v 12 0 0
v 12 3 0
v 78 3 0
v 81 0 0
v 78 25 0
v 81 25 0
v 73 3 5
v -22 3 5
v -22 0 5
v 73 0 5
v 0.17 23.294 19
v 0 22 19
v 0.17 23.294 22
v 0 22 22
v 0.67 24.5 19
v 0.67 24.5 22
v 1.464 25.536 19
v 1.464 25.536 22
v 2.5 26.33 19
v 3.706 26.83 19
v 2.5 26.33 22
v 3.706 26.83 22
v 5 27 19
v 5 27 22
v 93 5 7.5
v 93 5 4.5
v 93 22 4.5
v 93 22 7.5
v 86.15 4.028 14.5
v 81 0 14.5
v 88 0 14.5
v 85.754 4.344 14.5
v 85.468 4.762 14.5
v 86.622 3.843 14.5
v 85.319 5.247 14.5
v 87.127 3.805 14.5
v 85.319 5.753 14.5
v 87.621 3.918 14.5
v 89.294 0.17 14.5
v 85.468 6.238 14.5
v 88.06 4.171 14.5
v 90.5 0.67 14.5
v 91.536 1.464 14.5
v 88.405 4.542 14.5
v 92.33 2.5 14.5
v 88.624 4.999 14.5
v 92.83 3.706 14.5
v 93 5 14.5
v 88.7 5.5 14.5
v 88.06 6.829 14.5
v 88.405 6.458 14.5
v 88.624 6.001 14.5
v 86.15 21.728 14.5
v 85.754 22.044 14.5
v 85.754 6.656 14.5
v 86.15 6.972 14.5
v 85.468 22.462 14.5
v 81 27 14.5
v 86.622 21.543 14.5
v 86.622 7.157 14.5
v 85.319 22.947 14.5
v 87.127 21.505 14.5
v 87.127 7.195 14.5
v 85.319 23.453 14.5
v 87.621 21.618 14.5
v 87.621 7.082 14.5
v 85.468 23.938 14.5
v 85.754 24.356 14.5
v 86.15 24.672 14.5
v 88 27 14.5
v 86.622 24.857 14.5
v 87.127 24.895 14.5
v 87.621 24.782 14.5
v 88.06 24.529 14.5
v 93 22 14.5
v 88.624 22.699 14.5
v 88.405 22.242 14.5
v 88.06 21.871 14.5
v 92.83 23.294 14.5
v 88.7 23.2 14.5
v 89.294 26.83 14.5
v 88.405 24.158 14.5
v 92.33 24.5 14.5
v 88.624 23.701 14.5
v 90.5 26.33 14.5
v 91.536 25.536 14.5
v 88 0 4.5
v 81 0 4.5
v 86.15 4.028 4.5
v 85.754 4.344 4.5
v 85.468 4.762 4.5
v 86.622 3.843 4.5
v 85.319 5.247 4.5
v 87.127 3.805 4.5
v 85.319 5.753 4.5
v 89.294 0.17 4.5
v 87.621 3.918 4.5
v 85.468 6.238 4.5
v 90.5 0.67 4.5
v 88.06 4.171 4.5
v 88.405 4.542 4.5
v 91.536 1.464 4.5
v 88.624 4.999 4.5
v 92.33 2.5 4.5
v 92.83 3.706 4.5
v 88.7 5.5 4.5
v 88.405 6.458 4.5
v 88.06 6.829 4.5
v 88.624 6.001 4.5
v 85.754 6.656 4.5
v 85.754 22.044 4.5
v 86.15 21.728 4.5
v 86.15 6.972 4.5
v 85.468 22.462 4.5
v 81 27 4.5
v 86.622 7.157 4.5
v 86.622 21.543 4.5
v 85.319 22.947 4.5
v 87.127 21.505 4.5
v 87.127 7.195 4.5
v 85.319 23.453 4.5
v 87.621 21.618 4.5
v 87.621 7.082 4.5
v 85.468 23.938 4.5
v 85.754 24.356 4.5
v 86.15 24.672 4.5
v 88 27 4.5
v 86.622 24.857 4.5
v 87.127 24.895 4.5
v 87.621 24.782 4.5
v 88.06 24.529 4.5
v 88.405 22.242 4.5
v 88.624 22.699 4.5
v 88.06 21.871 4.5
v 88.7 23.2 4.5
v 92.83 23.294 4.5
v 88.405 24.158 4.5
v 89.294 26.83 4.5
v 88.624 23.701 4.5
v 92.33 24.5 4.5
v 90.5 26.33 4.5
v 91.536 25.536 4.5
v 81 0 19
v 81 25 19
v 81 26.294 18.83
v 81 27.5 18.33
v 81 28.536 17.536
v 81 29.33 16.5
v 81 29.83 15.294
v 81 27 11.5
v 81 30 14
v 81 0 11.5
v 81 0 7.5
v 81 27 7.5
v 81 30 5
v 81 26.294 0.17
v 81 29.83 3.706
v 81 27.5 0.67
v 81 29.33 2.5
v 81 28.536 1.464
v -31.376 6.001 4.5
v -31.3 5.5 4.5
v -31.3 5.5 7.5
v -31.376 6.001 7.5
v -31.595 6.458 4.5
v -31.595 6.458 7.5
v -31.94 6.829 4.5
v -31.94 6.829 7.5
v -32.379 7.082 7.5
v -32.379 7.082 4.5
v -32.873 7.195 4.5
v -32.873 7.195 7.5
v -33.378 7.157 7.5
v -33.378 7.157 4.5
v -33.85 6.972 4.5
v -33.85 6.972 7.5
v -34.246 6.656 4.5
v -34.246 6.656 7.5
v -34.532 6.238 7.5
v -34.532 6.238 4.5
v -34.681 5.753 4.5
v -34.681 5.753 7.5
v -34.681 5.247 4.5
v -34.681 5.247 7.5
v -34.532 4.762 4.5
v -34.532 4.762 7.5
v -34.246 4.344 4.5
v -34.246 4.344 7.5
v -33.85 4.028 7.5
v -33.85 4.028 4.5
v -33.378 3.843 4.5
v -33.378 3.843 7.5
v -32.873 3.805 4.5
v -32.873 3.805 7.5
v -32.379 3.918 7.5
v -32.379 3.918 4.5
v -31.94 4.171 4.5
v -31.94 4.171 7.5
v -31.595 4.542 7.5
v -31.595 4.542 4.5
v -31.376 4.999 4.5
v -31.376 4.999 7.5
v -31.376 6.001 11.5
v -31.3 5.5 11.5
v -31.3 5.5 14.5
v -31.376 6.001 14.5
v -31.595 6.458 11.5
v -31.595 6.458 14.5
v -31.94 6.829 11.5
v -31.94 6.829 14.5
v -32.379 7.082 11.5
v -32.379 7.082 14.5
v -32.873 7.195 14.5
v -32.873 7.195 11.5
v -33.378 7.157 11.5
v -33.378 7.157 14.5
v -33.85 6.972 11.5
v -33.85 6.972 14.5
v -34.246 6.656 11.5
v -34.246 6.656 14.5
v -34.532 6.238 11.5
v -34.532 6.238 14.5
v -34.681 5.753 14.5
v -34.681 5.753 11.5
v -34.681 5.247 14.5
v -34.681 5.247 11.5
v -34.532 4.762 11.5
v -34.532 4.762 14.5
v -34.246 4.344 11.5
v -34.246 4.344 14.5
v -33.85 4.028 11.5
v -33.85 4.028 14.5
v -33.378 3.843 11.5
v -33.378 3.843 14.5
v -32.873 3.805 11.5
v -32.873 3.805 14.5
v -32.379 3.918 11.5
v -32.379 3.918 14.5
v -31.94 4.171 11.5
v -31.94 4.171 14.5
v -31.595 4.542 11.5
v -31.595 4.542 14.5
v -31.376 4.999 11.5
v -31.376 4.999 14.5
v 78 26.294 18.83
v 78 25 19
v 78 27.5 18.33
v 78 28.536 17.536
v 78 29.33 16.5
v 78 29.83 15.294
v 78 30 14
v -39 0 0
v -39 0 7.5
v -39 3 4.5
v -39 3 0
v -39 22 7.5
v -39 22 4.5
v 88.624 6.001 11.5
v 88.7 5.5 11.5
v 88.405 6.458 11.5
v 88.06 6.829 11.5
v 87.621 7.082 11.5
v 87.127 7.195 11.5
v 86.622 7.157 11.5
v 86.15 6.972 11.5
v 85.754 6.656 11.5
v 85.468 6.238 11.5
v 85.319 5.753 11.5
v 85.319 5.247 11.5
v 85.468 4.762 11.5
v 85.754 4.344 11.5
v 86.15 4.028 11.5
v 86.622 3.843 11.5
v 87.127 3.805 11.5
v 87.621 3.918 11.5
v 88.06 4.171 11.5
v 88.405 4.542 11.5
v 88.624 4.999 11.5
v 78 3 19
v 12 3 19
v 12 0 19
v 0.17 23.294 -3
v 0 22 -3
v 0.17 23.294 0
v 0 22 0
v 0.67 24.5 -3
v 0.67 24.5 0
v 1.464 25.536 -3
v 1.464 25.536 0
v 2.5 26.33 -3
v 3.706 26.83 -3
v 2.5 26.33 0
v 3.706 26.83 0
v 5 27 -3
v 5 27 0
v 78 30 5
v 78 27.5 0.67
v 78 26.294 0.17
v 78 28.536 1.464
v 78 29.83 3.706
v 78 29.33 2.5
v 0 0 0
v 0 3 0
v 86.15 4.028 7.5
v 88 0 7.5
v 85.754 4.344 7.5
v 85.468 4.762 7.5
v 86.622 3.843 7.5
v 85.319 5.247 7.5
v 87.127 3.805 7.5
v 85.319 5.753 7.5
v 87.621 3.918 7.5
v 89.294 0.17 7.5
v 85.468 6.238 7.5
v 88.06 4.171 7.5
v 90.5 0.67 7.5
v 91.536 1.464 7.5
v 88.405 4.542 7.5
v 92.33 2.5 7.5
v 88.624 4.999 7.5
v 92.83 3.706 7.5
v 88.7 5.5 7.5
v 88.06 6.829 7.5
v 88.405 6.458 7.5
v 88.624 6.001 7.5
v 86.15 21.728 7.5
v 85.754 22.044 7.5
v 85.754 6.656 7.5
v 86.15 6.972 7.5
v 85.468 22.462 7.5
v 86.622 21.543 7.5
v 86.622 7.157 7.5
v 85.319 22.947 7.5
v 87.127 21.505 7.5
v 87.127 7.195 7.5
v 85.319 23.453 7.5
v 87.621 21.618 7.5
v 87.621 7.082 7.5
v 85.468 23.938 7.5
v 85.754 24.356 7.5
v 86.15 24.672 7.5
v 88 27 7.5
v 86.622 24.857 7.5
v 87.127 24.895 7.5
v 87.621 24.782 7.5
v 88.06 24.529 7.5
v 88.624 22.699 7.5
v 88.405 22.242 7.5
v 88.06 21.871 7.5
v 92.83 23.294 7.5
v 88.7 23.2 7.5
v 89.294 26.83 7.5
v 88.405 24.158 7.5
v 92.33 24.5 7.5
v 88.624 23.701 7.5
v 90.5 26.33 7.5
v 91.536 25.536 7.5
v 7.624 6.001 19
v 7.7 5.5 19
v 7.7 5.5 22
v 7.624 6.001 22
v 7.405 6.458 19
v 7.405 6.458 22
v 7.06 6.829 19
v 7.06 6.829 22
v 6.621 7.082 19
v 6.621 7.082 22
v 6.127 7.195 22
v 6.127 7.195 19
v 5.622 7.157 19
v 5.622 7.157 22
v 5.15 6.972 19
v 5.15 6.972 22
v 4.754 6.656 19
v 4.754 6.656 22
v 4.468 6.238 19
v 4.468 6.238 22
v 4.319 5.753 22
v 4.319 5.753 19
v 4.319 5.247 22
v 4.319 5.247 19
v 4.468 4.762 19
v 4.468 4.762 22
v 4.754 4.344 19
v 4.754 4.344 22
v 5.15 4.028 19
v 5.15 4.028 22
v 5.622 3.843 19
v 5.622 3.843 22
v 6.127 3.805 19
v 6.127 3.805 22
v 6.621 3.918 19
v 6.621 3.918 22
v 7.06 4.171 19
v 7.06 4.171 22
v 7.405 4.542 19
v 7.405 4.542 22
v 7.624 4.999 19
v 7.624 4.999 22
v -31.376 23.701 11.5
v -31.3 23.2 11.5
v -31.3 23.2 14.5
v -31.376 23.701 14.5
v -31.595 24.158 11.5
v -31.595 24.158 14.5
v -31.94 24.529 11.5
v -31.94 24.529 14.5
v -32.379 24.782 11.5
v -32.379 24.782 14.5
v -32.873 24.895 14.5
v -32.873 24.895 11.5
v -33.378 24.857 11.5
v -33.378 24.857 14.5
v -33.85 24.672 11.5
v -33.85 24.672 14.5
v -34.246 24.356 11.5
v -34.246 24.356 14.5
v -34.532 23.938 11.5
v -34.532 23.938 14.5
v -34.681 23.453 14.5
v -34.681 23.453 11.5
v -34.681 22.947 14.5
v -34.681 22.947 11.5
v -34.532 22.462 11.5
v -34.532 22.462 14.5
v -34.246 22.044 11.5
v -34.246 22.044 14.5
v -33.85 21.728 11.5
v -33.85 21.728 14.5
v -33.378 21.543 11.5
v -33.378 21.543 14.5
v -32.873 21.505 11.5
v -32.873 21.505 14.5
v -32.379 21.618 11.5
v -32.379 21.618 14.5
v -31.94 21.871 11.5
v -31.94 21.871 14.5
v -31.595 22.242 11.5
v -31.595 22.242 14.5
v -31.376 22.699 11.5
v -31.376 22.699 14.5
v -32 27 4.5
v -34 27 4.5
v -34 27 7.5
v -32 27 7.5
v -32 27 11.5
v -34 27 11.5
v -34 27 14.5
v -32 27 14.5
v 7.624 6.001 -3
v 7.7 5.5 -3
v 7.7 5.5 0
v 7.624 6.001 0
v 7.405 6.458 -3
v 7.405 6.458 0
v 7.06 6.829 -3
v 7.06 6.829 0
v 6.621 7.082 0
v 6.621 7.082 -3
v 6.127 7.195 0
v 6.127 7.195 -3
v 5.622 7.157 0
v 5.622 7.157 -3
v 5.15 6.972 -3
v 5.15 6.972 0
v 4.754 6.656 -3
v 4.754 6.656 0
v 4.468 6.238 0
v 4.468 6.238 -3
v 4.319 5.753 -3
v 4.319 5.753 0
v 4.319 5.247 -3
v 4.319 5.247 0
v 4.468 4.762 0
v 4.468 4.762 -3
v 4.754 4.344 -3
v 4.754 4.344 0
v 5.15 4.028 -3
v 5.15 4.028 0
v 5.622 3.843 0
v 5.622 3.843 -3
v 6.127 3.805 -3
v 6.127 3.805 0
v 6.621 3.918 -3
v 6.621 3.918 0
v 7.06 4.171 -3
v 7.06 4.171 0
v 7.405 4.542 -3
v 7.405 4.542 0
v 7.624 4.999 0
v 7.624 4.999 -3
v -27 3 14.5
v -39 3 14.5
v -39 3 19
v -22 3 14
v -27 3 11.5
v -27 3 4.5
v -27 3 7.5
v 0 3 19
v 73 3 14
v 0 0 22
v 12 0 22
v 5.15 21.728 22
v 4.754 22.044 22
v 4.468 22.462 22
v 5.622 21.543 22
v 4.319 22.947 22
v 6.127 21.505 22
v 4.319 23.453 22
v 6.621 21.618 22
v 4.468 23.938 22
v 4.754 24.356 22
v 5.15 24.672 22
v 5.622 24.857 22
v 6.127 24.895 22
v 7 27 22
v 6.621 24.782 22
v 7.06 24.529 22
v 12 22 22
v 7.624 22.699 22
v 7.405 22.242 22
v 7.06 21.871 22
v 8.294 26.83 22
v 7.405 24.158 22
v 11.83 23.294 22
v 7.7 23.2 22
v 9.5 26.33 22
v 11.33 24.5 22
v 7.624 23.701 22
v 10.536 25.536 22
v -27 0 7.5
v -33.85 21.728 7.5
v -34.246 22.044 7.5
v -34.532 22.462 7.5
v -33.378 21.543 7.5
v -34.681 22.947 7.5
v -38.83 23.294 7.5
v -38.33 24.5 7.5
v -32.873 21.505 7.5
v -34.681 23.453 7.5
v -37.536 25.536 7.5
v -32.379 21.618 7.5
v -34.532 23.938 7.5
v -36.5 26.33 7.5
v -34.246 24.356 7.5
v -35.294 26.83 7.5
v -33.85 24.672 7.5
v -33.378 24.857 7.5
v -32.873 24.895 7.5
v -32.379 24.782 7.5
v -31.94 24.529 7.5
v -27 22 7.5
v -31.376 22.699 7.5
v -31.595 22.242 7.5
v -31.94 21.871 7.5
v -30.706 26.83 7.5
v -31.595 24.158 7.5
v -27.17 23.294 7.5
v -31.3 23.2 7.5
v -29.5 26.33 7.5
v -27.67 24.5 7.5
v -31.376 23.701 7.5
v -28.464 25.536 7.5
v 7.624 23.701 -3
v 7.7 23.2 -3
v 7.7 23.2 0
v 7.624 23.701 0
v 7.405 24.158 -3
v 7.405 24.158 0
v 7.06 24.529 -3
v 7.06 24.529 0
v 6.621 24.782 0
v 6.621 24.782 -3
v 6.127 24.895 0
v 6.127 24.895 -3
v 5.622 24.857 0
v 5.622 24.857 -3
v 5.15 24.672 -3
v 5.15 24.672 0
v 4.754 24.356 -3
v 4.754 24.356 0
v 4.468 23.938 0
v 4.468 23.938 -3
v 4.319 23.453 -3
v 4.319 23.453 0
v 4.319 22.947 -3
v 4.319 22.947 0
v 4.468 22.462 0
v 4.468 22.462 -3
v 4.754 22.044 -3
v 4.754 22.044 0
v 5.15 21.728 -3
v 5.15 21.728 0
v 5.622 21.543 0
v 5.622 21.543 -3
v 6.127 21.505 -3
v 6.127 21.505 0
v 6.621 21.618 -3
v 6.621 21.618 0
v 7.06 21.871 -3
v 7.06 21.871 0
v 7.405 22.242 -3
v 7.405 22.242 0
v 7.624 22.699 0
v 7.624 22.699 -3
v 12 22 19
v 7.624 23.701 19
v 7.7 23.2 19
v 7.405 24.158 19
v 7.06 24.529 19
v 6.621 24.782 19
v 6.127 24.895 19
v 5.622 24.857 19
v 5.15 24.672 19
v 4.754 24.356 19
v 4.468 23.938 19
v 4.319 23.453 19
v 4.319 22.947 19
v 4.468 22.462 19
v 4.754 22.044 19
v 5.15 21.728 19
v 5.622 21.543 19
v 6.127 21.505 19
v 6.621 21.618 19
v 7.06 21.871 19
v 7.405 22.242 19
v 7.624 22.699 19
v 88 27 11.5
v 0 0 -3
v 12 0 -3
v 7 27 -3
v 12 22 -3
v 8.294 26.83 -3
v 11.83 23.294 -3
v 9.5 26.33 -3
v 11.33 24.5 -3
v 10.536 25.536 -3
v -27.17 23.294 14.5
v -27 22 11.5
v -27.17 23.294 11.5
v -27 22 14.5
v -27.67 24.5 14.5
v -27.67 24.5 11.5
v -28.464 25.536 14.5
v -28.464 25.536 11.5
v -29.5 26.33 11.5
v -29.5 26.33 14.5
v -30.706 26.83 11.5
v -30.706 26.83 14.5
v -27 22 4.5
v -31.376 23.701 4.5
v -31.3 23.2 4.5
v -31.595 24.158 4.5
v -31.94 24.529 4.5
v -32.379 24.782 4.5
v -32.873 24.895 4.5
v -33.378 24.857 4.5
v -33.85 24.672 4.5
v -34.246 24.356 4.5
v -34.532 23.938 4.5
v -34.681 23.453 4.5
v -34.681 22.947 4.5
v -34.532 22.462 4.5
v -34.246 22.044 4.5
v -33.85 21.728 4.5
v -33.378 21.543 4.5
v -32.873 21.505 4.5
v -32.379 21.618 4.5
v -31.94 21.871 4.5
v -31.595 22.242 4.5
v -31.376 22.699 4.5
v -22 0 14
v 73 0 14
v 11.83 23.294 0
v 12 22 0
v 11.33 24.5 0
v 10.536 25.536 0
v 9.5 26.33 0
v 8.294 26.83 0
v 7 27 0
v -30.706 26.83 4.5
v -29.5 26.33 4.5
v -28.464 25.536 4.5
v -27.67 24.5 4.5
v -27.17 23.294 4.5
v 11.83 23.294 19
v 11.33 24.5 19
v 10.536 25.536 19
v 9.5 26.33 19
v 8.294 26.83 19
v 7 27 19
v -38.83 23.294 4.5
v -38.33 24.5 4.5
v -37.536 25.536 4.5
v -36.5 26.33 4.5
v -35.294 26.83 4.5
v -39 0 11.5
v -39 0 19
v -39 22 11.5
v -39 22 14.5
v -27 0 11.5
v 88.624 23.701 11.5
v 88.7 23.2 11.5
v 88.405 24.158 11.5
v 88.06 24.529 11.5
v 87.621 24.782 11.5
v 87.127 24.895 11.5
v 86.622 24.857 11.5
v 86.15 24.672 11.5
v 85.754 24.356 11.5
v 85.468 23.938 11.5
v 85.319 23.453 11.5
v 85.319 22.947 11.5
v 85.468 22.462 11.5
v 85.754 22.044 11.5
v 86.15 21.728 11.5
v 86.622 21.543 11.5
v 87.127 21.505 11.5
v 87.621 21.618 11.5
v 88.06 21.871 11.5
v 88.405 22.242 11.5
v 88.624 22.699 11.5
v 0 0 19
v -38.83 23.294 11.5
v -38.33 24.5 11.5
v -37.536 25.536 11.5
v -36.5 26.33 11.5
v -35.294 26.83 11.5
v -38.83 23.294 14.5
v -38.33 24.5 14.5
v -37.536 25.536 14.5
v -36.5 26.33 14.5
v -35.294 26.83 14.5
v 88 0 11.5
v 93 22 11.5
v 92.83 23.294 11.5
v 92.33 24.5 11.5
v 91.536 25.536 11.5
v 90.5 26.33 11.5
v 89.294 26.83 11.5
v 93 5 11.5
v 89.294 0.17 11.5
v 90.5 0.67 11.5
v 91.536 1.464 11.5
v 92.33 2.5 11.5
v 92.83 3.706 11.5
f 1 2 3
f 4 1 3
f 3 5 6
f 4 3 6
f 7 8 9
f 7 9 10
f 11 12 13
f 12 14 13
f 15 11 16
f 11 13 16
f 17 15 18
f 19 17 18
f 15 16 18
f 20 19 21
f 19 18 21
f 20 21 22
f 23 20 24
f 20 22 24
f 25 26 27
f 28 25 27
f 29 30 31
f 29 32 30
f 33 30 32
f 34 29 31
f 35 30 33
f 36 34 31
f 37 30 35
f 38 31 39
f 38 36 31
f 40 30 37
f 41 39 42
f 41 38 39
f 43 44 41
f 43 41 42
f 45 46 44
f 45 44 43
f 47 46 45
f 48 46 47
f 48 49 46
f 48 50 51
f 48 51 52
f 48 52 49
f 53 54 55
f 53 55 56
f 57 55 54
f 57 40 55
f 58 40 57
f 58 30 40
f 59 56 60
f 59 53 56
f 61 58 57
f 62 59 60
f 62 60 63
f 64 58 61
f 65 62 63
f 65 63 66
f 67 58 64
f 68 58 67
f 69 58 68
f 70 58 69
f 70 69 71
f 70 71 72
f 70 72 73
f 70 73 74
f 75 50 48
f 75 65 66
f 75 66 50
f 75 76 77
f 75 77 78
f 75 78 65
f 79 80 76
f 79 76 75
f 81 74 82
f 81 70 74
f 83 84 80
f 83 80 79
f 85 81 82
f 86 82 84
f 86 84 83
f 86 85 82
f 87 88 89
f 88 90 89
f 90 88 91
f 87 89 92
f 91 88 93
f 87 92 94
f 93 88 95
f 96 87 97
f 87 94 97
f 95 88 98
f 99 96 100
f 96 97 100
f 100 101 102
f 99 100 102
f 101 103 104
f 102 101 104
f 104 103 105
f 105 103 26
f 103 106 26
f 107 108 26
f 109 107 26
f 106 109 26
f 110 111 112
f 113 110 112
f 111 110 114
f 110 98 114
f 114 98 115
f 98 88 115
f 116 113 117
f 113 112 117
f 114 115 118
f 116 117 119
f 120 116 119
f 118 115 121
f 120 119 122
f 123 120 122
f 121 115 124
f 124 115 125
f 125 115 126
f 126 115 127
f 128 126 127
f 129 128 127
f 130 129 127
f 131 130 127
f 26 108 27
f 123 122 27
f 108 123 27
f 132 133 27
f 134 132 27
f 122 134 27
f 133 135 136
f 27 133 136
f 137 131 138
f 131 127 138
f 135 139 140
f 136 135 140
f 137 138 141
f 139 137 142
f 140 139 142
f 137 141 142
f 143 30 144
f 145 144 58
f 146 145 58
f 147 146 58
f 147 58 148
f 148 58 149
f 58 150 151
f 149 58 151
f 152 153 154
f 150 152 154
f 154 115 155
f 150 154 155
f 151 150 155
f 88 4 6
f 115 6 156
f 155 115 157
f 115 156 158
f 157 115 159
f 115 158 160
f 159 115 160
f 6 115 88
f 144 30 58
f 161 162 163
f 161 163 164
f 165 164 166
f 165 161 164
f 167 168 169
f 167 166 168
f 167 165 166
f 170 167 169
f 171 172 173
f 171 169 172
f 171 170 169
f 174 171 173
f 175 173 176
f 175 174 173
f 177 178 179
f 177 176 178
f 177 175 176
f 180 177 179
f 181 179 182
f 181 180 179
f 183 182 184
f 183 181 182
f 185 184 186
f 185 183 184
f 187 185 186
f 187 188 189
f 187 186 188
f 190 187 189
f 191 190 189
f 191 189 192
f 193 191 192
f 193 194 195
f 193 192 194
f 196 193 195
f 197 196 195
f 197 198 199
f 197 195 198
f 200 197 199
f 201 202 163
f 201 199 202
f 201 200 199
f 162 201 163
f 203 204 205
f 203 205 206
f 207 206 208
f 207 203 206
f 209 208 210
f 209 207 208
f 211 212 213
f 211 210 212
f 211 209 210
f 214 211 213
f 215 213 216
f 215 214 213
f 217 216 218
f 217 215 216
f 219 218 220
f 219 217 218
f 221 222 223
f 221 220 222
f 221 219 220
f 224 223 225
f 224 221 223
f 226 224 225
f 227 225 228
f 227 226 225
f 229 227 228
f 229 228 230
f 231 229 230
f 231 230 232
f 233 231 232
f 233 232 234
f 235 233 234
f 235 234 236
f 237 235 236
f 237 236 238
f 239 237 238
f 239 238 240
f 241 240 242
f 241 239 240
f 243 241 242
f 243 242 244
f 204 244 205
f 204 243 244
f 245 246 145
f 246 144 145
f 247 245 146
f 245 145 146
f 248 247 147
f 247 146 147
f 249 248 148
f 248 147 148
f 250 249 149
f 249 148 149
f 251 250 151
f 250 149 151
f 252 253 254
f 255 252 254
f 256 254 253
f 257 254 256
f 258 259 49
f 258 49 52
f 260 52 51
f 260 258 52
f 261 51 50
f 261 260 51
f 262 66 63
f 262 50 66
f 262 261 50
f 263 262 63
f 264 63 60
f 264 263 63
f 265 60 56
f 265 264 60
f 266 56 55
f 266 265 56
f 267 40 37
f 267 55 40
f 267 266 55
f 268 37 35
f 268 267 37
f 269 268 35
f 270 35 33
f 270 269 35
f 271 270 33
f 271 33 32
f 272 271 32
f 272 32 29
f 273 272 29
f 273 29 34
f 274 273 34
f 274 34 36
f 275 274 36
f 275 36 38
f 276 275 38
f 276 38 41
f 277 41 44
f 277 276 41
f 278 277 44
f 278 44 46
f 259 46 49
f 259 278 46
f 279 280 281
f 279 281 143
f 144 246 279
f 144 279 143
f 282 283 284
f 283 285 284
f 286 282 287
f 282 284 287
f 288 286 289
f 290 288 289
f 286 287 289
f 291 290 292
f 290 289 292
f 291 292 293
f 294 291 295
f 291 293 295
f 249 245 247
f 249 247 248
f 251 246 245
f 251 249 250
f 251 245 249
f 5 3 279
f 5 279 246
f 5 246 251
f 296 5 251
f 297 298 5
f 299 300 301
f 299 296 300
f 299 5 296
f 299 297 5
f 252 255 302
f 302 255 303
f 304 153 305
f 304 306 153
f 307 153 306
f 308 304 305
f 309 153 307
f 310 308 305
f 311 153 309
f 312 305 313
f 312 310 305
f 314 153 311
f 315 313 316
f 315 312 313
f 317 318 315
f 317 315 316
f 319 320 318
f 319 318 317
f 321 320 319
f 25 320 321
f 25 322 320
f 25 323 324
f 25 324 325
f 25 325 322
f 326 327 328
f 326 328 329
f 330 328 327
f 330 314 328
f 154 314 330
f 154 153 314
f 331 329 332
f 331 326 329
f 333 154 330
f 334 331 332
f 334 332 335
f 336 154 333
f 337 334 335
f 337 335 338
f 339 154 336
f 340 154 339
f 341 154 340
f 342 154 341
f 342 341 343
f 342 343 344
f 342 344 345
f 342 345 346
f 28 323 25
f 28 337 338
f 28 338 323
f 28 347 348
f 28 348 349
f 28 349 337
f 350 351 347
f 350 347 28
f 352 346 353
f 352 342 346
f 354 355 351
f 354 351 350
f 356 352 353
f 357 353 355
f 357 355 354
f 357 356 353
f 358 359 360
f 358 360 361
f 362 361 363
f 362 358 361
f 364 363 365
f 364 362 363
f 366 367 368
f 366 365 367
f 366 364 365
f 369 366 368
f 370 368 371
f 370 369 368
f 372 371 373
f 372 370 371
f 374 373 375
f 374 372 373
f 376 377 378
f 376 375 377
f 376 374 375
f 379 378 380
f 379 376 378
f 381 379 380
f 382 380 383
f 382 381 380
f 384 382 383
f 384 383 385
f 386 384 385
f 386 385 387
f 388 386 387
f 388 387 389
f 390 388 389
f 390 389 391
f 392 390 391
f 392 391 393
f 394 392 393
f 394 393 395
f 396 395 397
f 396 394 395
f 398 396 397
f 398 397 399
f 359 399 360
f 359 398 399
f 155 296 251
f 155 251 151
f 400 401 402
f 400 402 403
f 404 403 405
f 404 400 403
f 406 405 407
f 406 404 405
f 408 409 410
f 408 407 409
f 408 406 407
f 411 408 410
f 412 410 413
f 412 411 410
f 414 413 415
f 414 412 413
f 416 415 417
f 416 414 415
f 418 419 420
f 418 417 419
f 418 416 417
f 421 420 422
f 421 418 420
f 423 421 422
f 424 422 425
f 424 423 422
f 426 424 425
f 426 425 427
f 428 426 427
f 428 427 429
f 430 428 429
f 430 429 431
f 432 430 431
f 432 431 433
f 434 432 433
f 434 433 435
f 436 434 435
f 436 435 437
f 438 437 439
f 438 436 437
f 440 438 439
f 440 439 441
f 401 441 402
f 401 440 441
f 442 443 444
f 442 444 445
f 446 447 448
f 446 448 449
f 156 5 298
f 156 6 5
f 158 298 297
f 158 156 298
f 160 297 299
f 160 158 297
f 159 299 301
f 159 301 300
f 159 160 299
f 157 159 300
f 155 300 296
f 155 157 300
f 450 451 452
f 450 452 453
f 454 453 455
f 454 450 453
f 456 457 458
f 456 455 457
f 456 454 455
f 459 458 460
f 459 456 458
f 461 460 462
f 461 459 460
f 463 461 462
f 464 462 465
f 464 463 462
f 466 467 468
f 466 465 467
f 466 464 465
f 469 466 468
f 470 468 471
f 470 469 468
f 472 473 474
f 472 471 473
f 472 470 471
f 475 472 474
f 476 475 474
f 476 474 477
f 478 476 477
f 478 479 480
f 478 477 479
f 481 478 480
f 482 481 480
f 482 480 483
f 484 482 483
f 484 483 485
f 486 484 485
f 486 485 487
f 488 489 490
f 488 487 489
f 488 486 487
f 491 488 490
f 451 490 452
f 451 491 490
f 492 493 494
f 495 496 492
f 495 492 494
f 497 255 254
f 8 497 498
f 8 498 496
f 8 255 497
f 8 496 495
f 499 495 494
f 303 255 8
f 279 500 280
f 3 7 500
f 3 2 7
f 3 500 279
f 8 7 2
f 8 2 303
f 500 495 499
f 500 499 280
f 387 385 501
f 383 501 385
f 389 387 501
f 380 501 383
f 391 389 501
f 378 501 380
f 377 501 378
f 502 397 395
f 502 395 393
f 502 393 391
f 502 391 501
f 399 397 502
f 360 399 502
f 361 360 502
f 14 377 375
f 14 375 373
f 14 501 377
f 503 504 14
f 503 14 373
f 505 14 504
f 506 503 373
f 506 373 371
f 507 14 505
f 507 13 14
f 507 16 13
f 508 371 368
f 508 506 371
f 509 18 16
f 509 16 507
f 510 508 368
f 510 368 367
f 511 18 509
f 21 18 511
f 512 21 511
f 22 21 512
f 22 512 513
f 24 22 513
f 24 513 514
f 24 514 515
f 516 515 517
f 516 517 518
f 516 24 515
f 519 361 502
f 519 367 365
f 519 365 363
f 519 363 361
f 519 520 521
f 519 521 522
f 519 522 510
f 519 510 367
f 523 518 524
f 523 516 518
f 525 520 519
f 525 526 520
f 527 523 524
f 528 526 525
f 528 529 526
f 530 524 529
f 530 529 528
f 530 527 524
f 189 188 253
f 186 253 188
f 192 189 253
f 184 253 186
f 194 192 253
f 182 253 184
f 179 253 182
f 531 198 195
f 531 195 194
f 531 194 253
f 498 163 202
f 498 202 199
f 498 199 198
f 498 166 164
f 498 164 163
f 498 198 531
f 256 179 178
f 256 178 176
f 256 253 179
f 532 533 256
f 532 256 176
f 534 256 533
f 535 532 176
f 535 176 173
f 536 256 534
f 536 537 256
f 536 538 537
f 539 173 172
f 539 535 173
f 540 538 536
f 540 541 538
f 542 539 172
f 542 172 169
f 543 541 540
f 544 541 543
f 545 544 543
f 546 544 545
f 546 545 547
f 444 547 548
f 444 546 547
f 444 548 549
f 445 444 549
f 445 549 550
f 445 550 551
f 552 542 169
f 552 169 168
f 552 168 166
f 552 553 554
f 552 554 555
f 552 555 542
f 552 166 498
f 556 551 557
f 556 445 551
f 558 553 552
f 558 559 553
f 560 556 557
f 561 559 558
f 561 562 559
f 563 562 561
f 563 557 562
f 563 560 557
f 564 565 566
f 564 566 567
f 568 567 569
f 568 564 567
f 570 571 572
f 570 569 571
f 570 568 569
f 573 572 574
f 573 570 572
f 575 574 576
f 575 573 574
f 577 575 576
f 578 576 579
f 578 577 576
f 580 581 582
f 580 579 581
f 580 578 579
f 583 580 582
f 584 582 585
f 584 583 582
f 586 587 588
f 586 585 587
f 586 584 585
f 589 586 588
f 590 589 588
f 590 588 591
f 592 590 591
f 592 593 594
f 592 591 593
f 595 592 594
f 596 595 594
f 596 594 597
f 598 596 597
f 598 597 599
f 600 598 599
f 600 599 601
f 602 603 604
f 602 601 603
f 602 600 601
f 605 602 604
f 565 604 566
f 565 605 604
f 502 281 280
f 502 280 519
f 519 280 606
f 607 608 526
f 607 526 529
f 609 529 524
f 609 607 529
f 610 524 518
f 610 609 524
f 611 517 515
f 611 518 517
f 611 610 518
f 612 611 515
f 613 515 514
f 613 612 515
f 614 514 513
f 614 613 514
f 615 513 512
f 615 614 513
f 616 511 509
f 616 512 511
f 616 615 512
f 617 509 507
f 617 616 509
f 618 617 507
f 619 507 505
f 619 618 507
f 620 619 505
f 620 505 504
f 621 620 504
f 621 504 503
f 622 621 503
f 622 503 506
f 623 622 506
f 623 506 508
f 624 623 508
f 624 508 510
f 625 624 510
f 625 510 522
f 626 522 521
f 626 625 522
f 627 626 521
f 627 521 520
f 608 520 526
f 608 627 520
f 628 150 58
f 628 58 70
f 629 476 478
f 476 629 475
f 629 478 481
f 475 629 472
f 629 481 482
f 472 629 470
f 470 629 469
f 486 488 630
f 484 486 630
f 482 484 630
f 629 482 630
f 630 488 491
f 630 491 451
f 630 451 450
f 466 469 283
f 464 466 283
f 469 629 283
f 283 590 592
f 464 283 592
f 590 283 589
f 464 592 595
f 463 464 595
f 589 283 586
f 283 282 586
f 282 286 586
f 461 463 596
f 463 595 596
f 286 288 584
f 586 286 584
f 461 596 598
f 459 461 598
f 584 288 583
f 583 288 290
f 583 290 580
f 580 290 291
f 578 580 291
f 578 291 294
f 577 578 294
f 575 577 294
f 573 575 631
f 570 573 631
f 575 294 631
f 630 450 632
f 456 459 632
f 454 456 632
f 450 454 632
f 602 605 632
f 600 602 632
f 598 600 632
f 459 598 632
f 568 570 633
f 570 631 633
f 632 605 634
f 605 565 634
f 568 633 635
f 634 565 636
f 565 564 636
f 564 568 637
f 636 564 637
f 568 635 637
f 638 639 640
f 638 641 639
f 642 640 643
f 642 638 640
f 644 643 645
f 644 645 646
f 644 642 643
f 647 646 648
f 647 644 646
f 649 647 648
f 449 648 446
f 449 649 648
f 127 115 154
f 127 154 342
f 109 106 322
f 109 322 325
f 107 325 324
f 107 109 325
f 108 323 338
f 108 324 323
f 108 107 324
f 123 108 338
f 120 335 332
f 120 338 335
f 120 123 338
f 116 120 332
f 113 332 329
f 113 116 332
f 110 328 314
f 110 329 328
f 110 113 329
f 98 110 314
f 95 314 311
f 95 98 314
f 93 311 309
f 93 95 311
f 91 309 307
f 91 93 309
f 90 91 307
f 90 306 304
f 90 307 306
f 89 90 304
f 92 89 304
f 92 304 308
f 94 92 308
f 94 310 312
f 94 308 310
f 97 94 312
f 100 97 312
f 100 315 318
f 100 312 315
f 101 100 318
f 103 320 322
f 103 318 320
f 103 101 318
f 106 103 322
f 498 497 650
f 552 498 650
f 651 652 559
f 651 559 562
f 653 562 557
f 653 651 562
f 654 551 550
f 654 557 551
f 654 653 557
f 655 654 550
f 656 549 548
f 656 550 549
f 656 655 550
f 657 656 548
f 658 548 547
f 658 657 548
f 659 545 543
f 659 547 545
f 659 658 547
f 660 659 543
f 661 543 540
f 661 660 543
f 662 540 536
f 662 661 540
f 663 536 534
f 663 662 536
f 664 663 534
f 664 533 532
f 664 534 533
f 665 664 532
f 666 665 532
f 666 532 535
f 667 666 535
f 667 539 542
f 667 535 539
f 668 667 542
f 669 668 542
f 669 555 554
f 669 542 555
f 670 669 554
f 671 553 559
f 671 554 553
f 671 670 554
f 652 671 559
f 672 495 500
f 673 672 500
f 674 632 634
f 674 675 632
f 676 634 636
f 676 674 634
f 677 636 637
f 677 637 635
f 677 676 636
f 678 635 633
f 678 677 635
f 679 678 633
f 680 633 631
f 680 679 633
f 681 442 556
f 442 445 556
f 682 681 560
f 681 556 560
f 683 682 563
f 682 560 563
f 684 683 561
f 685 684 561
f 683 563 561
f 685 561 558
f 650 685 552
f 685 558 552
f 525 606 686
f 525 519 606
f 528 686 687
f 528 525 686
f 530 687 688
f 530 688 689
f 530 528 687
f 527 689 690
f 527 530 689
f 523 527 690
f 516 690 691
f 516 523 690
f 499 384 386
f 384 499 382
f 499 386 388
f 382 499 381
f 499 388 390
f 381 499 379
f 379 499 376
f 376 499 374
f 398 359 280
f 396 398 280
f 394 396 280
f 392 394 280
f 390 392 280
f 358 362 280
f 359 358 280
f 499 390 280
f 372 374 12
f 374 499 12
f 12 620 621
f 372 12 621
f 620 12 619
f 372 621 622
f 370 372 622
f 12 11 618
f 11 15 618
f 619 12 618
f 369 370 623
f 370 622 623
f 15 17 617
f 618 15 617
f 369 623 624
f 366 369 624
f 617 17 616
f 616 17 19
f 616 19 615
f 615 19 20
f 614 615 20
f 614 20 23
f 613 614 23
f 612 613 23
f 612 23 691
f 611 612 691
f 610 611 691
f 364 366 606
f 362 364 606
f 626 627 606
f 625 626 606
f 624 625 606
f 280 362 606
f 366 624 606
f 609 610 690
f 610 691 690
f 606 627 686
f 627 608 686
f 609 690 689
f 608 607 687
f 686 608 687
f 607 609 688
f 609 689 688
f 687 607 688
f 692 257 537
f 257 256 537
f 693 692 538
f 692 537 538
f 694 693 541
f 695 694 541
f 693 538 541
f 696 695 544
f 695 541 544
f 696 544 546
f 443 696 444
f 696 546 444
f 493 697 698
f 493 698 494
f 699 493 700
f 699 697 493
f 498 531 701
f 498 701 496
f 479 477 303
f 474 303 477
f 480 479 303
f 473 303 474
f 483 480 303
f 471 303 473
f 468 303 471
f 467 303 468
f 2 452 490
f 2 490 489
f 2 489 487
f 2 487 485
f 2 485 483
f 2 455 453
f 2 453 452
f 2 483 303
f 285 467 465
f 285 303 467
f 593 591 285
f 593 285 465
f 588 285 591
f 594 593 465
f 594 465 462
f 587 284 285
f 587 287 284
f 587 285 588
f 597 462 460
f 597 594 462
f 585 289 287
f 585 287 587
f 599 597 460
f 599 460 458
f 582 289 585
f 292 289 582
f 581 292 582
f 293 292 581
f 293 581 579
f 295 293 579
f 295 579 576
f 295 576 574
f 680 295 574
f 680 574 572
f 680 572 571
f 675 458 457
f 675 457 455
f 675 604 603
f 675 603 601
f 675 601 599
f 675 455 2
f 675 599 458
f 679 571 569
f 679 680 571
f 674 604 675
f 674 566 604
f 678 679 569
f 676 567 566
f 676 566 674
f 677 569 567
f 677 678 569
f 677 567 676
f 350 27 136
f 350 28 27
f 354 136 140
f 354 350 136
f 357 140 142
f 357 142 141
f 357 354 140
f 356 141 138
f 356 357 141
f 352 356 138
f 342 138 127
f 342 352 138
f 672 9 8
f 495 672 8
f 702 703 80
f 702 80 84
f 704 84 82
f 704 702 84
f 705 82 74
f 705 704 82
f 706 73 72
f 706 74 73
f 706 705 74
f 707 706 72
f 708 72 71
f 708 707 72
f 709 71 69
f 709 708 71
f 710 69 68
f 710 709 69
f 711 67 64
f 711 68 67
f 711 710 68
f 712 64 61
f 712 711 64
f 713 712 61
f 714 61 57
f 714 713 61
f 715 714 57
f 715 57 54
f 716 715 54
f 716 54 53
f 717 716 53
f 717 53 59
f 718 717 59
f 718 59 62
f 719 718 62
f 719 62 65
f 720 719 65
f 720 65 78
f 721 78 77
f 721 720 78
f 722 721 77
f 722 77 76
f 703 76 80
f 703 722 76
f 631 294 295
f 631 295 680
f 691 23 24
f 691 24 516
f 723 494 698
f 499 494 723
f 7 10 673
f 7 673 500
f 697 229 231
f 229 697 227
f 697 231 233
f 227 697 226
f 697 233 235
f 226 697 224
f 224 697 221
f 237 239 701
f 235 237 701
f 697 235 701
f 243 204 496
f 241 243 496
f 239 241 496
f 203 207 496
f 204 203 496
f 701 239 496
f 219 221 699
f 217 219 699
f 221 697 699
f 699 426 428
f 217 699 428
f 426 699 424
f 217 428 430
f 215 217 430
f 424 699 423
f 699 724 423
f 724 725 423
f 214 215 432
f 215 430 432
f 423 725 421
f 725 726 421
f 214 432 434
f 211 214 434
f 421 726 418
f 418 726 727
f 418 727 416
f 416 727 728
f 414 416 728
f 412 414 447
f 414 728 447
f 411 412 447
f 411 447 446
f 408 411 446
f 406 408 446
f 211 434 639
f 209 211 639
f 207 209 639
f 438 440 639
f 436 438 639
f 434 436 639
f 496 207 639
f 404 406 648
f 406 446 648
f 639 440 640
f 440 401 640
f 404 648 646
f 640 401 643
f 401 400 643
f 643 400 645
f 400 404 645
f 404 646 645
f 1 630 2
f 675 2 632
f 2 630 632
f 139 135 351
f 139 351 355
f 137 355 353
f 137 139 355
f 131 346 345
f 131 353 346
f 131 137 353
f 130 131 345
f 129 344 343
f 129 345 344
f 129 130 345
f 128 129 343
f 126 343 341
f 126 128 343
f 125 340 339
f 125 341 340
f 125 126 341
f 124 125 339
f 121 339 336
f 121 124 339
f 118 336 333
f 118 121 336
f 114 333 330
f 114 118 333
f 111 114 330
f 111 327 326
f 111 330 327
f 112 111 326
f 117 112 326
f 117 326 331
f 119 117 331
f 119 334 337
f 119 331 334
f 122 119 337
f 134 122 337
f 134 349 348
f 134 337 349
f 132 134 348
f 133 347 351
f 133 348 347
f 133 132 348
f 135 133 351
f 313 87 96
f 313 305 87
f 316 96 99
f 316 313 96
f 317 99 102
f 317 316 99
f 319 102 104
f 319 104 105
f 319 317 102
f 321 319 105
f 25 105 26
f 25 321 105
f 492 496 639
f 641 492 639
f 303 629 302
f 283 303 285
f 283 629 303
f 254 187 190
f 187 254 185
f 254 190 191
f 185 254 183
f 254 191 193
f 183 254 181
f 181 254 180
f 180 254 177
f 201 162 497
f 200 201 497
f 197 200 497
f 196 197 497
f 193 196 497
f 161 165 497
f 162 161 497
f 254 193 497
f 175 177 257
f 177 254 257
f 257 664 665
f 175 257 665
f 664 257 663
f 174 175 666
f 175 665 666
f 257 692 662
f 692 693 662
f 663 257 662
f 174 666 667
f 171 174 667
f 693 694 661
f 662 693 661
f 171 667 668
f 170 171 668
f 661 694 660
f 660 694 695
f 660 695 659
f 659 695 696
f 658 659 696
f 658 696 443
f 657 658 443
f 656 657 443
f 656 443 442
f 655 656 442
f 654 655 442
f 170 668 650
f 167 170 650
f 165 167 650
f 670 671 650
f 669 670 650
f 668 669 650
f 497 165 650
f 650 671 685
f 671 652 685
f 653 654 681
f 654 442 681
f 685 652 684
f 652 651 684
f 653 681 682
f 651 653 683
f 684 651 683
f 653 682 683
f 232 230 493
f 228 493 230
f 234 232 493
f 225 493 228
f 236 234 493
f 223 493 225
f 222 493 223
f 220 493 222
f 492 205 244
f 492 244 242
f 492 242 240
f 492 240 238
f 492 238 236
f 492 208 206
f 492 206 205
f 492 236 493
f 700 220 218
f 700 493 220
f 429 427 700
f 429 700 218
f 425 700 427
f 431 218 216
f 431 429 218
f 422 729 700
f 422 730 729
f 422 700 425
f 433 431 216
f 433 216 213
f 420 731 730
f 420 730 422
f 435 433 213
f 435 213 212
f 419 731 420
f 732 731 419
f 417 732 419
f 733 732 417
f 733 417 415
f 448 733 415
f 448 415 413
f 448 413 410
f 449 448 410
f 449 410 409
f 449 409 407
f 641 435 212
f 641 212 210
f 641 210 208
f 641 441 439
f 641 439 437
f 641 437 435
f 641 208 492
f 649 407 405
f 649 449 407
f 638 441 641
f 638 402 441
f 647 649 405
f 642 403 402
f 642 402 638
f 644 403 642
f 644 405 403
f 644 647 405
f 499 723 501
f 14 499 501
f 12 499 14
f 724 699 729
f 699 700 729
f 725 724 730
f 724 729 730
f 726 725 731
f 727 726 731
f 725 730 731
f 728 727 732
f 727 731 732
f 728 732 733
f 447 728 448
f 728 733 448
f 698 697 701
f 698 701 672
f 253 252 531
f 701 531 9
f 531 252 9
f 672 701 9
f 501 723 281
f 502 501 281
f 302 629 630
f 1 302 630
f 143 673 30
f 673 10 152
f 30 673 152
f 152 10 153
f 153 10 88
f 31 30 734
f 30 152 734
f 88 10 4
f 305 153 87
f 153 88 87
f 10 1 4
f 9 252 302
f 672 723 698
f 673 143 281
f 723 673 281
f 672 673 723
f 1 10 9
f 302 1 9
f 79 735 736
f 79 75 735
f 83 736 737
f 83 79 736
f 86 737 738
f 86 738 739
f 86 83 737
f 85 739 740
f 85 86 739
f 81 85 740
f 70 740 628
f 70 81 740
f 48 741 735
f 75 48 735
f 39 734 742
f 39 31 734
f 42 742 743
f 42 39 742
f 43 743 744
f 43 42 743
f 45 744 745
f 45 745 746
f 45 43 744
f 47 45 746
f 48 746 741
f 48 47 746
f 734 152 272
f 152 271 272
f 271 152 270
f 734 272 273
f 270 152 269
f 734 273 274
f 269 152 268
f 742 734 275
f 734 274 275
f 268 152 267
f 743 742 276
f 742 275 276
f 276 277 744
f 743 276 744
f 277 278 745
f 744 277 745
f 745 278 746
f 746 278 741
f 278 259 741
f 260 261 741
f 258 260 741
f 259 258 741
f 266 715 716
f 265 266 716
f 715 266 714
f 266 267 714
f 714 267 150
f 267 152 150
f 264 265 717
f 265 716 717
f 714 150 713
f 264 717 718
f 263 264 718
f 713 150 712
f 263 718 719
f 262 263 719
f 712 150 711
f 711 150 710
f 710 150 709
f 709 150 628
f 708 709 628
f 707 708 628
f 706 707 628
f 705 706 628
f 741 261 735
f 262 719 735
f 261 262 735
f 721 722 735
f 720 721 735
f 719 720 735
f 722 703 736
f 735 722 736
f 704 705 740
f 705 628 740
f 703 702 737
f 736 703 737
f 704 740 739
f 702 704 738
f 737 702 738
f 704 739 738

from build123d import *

# Parameters (mm, degrees)
BOX009_W          = 95
BOX009_H          = 5
BOX009_DEPTH      = 9
CYLINDER001_R     = 1.7
CYLINDER001_DEPTH = 31
CYLINDER_R        = 1.7
CYLINDER_DEPTH    = 31
BOX005_W          = 12
BOX005_H          = 27
BOX005_DEPTH      = 3
BOX006_W          = 12
BOX006_H          = 27
BOX006_DEPTH      = 3
BOX007_W          = 12
BOX007_H          = 27
BOX007_DEPTH      = 3
BOX003_W          = 3
BOX003_H          = 30
BOX003_DEPTH      = 19
BOX001_W          = 12
BOX001_H          = 27
BOX001_DEPTH      = 3
BOX002_W          = 12
BOX002_H          = 27
BOX002_DEPTH      = 3
BOX008_W          = 12
BOX008_H          = 10
BOX008_DEPTH      = 4
BOX_W             = 117
BOX_H             = 3
BOX_DEPTH         = 19
BOX004_W          = 12
BOX004_H          = 27
BOX004_DEPTH      = 3
FILLET_R          = 5


with BuildPart() as cube009:
    # Box009 → Box009 (new body)
    with BuildSketch(Plane(origin=(-22, 0, 5), x_dir=(1, 0, 0), z_dir=(0, 0, 1))):
        with Locations((47.5, 2.5)):
            Rectangle(BOX009_W, BOX009_H)
    extrude(amount=BOX009_DEPTH)


with BuildPart() as cylinder001:
    # Cylinder001 → Cylinder001 (new body)
    with BuildSketch(Plane(origin=(6, 23.2, -6), x_dir=(1, 0, 0), z_dir=(0, 0, 1))):
        Circle(CYLINDER001_R)
    extrude(amount=CYLINDER001_DEPTH)


with BuildPart() as cylinder:
    # Cylinder → Cylinder (new body)
    with BuildSketch(Plane(origin=(6, 5.5, -6), x_dir=(1, 0, 0), z_dir=(0, 0, 1))):
        Circle(CYLINDER_R)
    extrude(amount=CYLINDER_DEPTH)


with BuildPart() as fusion002:
    # Fusion002 base: copy of Cylinder
    add(cylinder.part)

    # Fusion002: union Cylinder001
    add(cylinder001.part)


with BuildPart() as fusion002_1:
    # Fusion002 placement: moved
    add(fusion002.part.moved(Location((81, 0, 0))))


with BuildPart() as fusion003:
    # Fusion003 base: copy of Cylinder
    add(cylinder.part)

    # Fusion003: union Cylinder001
    add(cylinder001.part)


with BuildPart() as fusion003_1:
    # Fusion003 placement: moved
    add(fusion003.part.moved(Location((-39, 0, 0))))


with BuildPart() as cilindros:
    # Fusion001 base: copy of Cylinder
    add(cylinder.part)

    # Fusion001: union Cylinder001
    add(cylinder001.part)

    # Fusion004: union Fusion002, Fusion003
    add(fusion002_1.part)
    add(fusion003_1.part)


with BuildPart() as cube005:
    # Box005 → Box005 (new body)
    with BuildSketch(Plane(origin=(-39, 0, 11.5), x_dir=(1, 0, 0), z_dir=(0, 0, 1))):
        with Locations((6, 13.5)):
            Rectangle(BOX005_W, BOX005_H)
    extrude(amount=BOX005_DEPTH)


with BuildPart() as cube006:
    # Box006 → Box006 (new body)
    with BuildSketch(Plane(origin=(81, 0, 4.5), x_dir=(1, 0, 0), z_dir=(0, 0, 1))):
        with Locations((6, 13.5)):
            Rectangle(BOX006_W, BOX006_H)
    extrude(amount=BOX006_DEPTH)


with BuildPart() as cube007:
    # Box007 → Box007 (new body)
    with BuildSketch(Plane(origin=(81, 0, 11.5), x_dir=(1, 0, 0), z_dir=(0, 0, 1))):
        with Locations((6, 13.5)):
            Rectangle(BOX007_W, BOX007_H)
    extrude(amount=BOX007_DEPTH)


with BuildPart() as cube003:
    # Box003 → Box003 (new body)
    with BuildSketch(Plane(origin=(78, 0, 0), x_dir=(1, 0, 0), z_dir=(0, 0, 1))):
        with Locations((1.5, 15)):
            Rectangle(BOX003_W, BOX003_H)
    extrude(amount=BOX003_DEPTH)


with BuildPart() as cube001:
    # Box001 → Box001 (new body)
    with BuildSketch(Plane.XY.offset(-3)):
        with Locations((6, 13.5)):
            Rectangle(BOX001_W, BOX001_H)
    extrude(amount=BOX001_DEPTH)


with BuildPart() as cube002:
    # Box002 → Box002 (new body)
    with BuildSketch(Plane.XY.offset(19)):
        with Locations((6, 13.5)):
            Rectangle(BOX002_W, BOX002_H)
    extrude(amount=BOX002_DEPTH)


with BuildPart() as cube008:
    # Box008 → Box008 (new body)
    with BuildSketch(Plane(origin=(-39, -7, 7.5), x_dir=(1, 0, 0), z_dir=(0, 0, 1))):
        with Locations((6, 5)):
            Rectangle(BOX008_W, BOX008_H)
    extrude(amount=BOX008_DEPTH)


with BuildPart() as cut:
    # Box → Box (new body)
    with BuildSketch(Plane(origin=(-39, 0, 0), x_dir=(1, 0, 0), z_dir=(0, 0, 1))):
        with Locations((58.5, 1.5)):
            Rectangle(BOX_W, BOX_H)
    extrude(amount=BOX_DEPTH)

    # Cut: cut Cube008
    add(cube008.part, mode=Mode.SUBTRACT)


with BuildPart() as cut002:
    # Box004 → Box004 (new body)
    with BuildSketch(Plane(origin=(-39, 0, 4.5), x_dir=(1, 0, 0), z_dir=(0, 0, 1))):
        with Locations((6, 13.5)):
            Rectangle(BOX004_W, BOX004_H)
    extrude(amount=BOX004_DEPTH)

    # Fusion: union Cube005, Cube006, Cube007, Cube003, Cube001, Cube002, Cut
    add(cube005.part)
    add(cube006.part)
    add(cube007.part)
    add(cube003.part)
    add(cube001.part)
    add(cube002.part)
    add(cut.part)

    # Cut001: cut cilindros
    add(cilindros.part, mode=Mode.SUBTRACT)

    # Fillet
    fillet_edges = [cut002.edges().sort_by_distance(p)[0] for p in [
        (93, 0, 6),
        (93, 0, 13),
        (93, 27, 6),
        (93, 27, 13),
        (79.5, 30, 19),
        (79.5, 30, 0),
        (0, 27, 20.5),
        (-39, 27, 13),
        (-39, 27, 6),
        (0, 27, -1.5),
        (12, 27, -1.5),
        (12, 27, 20.5),
        (-27, 27, 13),
        (-27, 27, 6),
    ]]
    fillet(fillet_edges, radius=FILLET_R)

    # Cut002: cut Cube009
    add(cube009.part, mode=Mode.SUBTRACT)


solid = cut002.part
